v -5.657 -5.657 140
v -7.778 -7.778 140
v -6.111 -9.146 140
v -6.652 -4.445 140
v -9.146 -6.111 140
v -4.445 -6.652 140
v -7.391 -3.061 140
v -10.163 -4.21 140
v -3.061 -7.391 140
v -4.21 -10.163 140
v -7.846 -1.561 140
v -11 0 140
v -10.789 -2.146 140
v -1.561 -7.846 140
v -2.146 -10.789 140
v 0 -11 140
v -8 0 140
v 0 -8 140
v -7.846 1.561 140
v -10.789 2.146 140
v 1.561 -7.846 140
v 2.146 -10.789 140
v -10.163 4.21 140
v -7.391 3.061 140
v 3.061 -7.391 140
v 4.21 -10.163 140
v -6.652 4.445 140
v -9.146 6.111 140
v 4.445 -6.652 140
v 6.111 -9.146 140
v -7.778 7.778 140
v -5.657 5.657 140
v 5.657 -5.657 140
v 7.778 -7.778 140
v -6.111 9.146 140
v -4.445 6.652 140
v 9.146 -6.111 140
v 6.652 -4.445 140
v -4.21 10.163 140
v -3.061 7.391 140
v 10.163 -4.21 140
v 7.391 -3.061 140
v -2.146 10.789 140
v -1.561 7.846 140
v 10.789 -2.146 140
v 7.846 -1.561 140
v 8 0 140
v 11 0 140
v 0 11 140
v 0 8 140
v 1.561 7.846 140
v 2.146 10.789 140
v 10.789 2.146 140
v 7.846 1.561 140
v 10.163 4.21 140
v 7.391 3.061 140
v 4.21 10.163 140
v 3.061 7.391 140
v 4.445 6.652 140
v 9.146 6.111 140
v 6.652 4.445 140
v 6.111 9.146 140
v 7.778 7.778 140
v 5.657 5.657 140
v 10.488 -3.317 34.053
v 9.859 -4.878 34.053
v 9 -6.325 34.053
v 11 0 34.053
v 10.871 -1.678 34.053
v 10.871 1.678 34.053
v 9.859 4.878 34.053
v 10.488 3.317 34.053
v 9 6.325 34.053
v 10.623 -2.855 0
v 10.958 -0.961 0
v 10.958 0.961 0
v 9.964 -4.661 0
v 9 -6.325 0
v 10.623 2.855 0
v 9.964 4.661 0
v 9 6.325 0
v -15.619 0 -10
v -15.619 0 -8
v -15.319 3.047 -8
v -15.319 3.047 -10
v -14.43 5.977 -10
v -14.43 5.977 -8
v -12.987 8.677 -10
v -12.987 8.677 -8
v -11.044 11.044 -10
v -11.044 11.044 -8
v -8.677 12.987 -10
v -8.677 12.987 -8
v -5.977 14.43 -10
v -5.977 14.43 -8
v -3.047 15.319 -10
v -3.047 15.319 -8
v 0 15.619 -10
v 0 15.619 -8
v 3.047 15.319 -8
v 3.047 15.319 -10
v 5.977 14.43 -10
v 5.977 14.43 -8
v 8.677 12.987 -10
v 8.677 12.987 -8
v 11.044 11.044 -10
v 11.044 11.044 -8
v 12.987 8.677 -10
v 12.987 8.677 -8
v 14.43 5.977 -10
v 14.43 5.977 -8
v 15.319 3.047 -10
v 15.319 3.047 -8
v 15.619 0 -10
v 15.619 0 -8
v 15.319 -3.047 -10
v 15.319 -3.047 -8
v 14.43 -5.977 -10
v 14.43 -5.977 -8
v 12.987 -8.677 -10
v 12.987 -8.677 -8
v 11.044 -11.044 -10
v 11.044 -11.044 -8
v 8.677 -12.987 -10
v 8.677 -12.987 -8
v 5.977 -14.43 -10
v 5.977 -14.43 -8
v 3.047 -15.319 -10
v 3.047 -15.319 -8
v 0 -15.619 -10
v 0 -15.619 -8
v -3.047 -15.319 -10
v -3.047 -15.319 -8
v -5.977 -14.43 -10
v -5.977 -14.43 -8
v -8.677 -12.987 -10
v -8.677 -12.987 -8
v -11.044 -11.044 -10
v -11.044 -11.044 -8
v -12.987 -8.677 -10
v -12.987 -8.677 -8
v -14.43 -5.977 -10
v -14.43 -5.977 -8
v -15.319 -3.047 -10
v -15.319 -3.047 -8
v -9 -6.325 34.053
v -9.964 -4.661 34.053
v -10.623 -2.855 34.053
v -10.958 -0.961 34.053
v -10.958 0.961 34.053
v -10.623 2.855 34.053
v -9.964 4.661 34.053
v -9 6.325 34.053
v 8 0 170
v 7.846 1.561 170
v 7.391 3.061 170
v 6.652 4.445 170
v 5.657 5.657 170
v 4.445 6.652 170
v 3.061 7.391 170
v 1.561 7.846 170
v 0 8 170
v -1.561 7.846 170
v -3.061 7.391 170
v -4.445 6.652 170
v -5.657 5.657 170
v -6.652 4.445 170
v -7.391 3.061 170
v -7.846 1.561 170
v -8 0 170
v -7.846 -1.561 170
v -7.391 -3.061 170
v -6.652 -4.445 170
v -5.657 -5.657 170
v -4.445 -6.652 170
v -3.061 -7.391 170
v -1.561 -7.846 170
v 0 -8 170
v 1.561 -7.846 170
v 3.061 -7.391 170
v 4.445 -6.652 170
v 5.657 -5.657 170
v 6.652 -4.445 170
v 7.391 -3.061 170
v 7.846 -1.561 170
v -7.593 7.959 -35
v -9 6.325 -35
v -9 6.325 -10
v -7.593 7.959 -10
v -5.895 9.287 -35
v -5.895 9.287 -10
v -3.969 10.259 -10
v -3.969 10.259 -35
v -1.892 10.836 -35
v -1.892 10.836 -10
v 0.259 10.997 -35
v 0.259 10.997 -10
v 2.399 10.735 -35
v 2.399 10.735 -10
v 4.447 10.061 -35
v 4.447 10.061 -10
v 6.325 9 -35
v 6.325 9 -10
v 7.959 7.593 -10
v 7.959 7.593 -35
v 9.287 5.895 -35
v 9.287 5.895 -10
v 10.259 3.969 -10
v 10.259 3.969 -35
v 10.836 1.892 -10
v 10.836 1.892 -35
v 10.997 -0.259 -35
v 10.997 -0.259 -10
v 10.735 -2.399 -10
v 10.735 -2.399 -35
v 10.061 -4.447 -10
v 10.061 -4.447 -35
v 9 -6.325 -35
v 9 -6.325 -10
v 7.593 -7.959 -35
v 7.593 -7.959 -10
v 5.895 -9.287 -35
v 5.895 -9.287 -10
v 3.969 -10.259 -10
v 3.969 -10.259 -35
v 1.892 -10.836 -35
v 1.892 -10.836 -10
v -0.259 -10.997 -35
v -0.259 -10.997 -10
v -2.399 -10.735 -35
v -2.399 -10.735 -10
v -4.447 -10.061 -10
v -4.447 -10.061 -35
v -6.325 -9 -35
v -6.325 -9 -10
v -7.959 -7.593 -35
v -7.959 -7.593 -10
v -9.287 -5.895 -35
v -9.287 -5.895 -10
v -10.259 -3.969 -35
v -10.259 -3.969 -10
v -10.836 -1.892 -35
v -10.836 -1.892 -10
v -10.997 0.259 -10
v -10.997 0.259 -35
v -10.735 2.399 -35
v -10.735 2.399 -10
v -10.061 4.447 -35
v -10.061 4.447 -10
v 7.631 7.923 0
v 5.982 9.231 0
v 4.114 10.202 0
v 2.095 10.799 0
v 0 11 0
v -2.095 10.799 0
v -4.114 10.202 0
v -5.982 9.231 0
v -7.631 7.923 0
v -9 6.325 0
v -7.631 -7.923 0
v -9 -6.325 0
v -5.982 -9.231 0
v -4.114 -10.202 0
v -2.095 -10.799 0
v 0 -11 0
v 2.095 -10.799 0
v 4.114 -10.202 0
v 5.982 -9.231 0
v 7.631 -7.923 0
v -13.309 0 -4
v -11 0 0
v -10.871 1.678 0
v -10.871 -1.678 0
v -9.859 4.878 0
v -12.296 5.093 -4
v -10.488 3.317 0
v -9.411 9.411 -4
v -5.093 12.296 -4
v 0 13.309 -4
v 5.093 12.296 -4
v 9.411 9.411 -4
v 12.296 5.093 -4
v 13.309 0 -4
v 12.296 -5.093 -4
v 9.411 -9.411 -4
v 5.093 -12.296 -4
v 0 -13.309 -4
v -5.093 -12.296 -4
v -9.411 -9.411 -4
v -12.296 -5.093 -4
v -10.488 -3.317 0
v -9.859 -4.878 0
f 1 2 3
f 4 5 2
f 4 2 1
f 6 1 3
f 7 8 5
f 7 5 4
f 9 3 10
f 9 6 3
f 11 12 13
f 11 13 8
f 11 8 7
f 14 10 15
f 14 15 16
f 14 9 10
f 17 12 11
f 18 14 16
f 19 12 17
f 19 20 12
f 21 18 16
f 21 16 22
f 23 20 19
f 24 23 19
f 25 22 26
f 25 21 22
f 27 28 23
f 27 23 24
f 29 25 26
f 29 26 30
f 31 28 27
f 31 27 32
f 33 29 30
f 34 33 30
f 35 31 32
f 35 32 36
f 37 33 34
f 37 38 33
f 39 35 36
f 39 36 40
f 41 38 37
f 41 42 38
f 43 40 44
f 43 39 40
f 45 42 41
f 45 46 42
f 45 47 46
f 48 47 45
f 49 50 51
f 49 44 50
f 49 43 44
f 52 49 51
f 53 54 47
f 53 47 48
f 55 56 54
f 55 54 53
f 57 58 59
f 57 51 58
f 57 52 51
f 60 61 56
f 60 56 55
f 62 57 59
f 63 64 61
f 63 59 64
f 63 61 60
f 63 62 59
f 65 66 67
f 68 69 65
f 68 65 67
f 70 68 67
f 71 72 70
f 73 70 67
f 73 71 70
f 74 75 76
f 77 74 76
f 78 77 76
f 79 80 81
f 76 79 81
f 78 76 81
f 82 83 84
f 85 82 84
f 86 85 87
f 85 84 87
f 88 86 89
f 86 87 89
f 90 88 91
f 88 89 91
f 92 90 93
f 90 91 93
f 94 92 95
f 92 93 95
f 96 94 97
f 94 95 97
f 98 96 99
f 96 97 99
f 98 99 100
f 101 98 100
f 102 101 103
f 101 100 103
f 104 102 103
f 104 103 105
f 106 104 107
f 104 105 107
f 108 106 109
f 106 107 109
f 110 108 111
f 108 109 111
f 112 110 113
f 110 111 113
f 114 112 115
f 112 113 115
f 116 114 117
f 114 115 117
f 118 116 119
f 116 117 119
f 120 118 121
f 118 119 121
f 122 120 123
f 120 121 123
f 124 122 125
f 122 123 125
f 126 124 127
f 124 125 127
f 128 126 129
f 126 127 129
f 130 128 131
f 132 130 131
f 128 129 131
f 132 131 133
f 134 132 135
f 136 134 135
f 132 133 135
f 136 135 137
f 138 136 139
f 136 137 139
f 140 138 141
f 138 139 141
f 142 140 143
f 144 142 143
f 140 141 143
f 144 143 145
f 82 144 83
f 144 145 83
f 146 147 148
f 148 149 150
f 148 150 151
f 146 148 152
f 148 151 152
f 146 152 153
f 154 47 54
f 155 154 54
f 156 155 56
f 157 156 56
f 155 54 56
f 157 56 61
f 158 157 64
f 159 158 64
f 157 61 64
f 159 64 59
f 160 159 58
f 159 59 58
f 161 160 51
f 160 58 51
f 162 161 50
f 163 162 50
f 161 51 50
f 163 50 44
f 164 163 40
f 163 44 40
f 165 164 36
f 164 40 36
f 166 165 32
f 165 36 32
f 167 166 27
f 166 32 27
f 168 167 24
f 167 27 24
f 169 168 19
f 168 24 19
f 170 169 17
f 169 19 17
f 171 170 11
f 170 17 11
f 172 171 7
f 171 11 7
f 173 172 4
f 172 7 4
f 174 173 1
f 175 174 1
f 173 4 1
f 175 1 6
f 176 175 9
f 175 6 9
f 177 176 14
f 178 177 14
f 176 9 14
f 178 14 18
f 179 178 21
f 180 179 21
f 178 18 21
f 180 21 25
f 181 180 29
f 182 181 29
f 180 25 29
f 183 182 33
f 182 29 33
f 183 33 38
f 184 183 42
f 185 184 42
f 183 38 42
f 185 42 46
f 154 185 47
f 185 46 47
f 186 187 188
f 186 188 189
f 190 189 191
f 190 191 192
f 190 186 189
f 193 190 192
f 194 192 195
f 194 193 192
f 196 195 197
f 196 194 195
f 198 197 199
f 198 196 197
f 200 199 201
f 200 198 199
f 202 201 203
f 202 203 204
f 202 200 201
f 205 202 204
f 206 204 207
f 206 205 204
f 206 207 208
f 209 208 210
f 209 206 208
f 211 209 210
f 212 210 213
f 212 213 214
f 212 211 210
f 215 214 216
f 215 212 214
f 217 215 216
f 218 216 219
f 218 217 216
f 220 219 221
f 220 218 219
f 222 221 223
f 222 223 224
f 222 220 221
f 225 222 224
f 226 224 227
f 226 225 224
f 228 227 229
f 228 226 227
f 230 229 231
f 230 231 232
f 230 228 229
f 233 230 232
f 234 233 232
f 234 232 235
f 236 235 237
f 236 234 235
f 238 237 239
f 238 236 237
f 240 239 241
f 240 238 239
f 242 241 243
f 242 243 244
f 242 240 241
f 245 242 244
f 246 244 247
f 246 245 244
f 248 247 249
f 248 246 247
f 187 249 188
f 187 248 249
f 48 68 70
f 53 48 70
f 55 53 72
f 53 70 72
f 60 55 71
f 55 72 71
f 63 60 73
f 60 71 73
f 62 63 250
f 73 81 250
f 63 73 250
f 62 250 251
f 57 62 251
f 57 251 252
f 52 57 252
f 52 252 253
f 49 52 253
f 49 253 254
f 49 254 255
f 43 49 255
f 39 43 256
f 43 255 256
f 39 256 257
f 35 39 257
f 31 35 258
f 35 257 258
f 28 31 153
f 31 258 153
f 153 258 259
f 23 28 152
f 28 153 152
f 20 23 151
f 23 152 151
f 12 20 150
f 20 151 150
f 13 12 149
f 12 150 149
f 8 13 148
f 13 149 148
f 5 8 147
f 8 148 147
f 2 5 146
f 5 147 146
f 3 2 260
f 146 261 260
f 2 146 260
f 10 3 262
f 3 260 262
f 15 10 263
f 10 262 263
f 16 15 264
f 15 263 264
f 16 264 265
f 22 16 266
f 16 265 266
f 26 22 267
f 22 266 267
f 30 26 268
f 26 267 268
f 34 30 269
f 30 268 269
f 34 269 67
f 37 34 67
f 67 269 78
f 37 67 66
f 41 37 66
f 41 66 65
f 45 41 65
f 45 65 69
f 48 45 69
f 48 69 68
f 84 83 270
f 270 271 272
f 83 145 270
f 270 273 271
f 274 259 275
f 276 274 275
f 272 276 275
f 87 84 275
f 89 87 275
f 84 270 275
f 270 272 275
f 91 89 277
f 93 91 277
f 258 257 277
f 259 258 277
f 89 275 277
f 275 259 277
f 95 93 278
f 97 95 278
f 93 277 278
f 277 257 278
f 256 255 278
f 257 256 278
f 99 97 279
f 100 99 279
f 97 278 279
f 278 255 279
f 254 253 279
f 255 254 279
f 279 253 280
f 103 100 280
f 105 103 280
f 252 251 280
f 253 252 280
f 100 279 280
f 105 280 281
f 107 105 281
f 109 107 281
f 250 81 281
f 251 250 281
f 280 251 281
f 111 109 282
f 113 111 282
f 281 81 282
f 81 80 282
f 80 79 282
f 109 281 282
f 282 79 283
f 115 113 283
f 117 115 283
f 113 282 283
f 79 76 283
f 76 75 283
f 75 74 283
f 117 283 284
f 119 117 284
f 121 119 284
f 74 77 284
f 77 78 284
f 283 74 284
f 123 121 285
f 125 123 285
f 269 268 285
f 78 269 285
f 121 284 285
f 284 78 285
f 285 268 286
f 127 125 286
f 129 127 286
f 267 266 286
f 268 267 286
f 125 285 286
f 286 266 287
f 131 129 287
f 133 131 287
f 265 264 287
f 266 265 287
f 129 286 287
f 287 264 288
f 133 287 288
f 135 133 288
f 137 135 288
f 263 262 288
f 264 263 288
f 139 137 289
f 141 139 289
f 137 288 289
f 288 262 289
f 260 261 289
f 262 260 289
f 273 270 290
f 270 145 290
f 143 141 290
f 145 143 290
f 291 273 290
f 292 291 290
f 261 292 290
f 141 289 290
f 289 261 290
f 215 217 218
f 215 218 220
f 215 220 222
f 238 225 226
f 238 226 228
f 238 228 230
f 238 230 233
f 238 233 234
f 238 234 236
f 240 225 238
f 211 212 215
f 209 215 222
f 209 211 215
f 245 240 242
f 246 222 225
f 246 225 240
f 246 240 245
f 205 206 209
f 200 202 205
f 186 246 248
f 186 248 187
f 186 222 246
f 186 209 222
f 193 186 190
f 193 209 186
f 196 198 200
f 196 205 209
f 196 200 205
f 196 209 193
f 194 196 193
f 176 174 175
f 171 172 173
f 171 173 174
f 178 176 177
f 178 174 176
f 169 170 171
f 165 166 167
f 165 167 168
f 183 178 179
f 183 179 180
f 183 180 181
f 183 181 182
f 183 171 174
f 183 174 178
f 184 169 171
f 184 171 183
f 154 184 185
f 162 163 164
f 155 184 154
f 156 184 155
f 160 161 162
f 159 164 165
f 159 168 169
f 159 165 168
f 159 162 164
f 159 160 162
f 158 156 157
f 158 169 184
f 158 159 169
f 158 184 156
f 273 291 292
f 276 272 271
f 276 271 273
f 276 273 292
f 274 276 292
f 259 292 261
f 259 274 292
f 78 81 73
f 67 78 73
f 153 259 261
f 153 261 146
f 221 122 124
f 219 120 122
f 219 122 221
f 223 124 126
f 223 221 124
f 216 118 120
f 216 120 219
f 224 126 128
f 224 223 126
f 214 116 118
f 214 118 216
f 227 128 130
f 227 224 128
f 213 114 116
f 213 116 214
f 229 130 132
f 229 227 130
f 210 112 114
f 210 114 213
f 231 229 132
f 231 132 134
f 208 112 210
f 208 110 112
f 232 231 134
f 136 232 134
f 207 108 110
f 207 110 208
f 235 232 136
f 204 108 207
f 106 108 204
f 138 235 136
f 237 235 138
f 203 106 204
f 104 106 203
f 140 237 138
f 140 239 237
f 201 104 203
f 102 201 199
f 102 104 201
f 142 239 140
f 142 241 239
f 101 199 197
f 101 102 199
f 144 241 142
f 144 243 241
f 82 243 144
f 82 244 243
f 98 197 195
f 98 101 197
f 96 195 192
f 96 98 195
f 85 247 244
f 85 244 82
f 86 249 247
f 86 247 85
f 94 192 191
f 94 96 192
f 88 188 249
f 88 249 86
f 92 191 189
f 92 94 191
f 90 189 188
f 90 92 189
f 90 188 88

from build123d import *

# Parameters (mm, degrees)
SKETCH1_R           = 11
BOSS_EXTRUDE1_DEPTH = 140
SKETCH2_R           = 8
BOSS_EXTRUDE2_DEPTH = 30
SKETCH3_R           = 11
BOSS_EXTRUDE3_DEPTH = 8
BOSS_EXTRUDE3_DRAFT = -30
SKETCH4_R           = 15.618802154
BOSS_EXTRUDE4_DEPTH = 2
SKETCH5_W           = 34.053216137
SKETCH5_H           = 15
CUT_EXTRUDE1_DEPTH  = 2
BOSS_EXTRUDE5_START = 25
SKETCH6_R           = 11
BOSS_EXTRUDE5_DEPTH = 25


with BuildPart() as part:
    # Sketch1 → Boss-Extrude1 (new body)
    with BuildSketch(Plane.XY):
        Circle(SKETCH1_R)
    extrude(amount=BOSS_EXTRUDE1_DEPTH)

    # Sketch2 → Boss-Extrude2 (add)
    with BuildSketch(Plane.XY.offset(140)):
        Circle(SKETCH2_R)
    extrude(amount=BOSS_EXTRUDE2_DEPTH)


with BuildPart() as boss_extrude3_tool:
    # Sketch3 → Boss-Extrude3 (with draft: the straight prism first)
    with BuildSketch(Plane(origin=(0, 0, 0), x_dir=(-1, 0, 0), z_dir=(0, 0, -1))):
        Circle(SKETCH3_R)
    extrude(amount=BOSS_EXTRUDE3_DEPTH)
    # Boss-Extrude3: the draft: its side faces are tilted about the plane it starts from
    boss_extrude3_sides = [boss_extrude3_tool.faces().sort_by_distance(p)[0] for p in [
        (11, 0, -4),
    ]]
    draft(boss_extrude3_sides, Plane(origin=(0, 0, 0), x_dir=(-1, 0, 0), z_dir=(0, 0, -1)), BOSS_EXTRUDE3_DRAFT)


with BuildPart() as part_1:
    add(part.part)

    # Boss-Extrude3: add boss_extrude3_tool
    add(boss_extrude3_tool.part)

    # Sketch4 → Boss-Extrude4 (add)
    with BuildSketch(Plane(origin=(0, 0, -8), x_dir=(-1, 0, 0), z_dir=(0, 0, -1))):
        Circle(SKETCH4_R)
    extrude(amount=BOSS_EXTRUDE4_DEPTH)

    # Sketch5 → Cut-Extrude1 (cut)
    with BuildSketch(Plane.ZY.offset(11)):
        with Locations((17.026608068, 0)):
            Rectangle(SKETCH5_W, SKETCH5_H)
    cut_extrude1 = extrude(amount=-CUT_EXTRUDE1_DEPTH, mode=Mode.SUBTRACT)

    # Mirror1: Cut-Extrude1 across plane
    add(cut_extrude1.mirror(Plane(origin=(0, 0, 0), x_dir=(0, 0, 1), z_dir=(1, 0, 0))), mode=Mode.SUBTRACT)

    # Sketch6 → Boss-Extrude5 (add)
    with BuildSketch(Plane(origin=(0, 0, -10), x_dir=(-1, 0, 0), z_dir=(0, 0, -1)).offset(BOSS_EXTRUDE5_START)):
        with Locations(Location((0, 0, 0), (0, 0, 35.096801228))):
            Circle(SKETCH6_R)
    extrude(amount=-BOSS_EXTRUDE5_DEPTH)


solid = part_1.part
